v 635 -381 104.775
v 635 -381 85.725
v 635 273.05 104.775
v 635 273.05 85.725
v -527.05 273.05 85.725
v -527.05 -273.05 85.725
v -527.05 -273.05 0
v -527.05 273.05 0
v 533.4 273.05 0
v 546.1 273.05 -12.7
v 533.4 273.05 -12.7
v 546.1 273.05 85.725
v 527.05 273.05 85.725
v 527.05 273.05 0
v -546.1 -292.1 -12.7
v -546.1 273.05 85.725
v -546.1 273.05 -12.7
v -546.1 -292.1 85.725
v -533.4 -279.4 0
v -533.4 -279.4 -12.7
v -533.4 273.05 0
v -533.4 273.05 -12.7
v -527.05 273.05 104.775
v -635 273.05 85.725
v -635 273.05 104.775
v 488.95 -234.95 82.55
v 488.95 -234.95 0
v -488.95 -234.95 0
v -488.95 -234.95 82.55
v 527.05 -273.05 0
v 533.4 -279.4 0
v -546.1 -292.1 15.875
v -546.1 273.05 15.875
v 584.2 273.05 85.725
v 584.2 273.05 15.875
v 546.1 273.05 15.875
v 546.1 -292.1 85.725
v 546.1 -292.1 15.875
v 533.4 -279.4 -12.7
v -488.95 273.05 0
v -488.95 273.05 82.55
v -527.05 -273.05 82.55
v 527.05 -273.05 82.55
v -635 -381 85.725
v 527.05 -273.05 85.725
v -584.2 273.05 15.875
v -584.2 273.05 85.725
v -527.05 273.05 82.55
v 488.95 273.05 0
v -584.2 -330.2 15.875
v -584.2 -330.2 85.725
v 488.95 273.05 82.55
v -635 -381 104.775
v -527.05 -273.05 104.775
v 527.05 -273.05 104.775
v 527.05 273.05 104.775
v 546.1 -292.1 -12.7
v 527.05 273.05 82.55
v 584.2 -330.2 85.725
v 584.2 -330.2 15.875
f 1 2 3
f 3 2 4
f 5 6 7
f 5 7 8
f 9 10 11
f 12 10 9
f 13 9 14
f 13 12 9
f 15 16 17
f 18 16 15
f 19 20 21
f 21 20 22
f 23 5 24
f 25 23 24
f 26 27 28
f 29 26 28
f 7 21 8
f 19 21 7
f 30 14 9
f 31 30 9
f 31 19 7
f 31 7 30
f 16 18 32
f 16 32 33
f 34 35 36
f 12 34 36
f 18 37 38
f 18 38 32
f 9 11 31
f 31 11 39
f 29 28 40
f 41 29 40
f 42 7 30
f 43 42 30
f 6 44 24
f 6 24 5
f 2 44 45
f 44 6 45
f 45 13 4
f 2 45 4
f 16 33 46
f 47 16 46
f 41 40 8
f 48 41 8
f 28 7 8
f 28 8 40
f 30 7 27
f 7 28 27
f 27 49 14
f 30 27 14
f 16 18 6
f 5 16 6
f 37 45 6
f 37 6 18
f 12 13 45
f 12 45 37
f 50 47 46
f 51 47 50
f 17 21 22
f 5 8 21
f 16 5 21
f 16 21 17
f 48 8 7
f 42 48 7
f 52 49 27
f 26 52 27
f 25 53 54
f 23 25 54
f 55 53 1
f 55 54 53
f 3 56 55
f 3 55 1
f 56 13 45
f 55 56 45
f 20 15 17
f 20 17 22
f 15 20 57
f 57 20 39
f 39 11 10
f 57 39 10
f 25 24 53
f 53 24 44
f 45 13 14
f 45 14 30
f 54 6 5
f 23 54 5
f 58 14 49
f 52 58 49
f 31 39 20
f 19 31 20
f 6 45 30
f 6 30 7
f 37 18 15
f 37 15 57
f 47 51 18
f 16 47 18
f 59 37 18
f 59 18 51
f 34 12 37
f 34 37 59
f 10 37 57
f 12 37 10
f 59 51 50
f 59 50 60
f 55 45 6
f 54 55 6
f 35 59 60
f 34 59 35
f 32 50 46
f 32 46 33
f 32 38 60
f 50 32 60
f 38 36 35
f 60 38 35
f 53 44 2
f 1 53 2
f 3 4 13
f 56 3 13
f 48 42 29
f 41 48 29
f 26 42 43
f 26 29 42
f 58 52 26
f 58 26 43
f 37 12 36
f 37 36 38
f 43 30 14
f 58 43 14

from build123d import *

# Parameters (mm, degrees)
F2_DEPTH  = 82.55
F4_DEPTH  = 85.725
F5_DEPTH  = 12.7
F7_DEPTH  = 12.7
F9_DEPTH  = 69.85
F11_DEPTH = 19.05


with BuildPart() as f2:
    # F1 (on face) → F2 (new body)
    with BuildSketch(Plane.XY):
        Polygon((-527.0500183105, -273.0500183105), (527.0500183105, -273.0500183105), (527.0500183105, 273.0500183105), (488.9500183105, 273.0500183105), (488.9500183105, 234.9500183105), (488.9500183105, -234.9500183105), (-488.9500183105, -234.9500183105), (-488.9500183105, 234.9500183105), (-488.9500183105, 273.0500183105), (-527.0500183105, 273.0500183105), align=None)
    extrude(amount=F2_DEPTH)


with BuildPart() as f4:
    # F3 (on Top) → F4 (new body)
    with BuildSketch(Plane.XY):
        Polygon((-527.0500183105, -273.0500183105), (-527.0500183105, 273.0500183105), (-546.1000183105, 273.0500183105), (-546.1000183105, -292.1000183105), (546.1000183105, -292.1000183105), (546.1000183105, 273.0500183105), (527.0500183105, 273.0500183105), (527.0500183105, -273.0500183105), align=None)
    extrude(amount=F4_DEPTH)

    # F5 (add): a face of the model
    f5_faces = [f4.faces().sort_by_distance(p)[0] for p in [
        (0, -285.3475606825, 0),
    ]]
    extrude(f5_faces, amount=F5_DEPTH)

    # F6 (on face) → F7 (cut)
    with BuildSketch(Plane(origin=(0, 0, -12.7), x_dir=(1, 0, 0), z_dir=(0, 0, -1))):
        Polygon((533.3999991417, -273.0500183105), (533.3999991417, 279.3999991417), (-533.3999991417, 279.3999991417), (-533.3999991417, -273.0500183105), (-527.0500183105, -273.0500183105), (-527.0500183105, 273.0500183105), (527.0500183105, 273.0500183105), (527.0500183105, -273.0500183105), align=None)
    extrude(amount=-F7_DEPTH, mode=Mode.SUBTRACT)


with BuildPart() as f9:
    # F8 (on face) → F9 (new body)
    with BuildSketch(Plane.XY.offset(85.725)):
        Polygon((-546.1000183105, -292.1000183105), (-546.1000183105, 273.0500183105), (-584.2000183105, 273.0500183105), (-584.2000183105, -330.2000183105), (584.2000183105, -330.2000183105), (584.2000183105, 273.0500183105), (546.1000183105, 273.0500183105), (546.1000183105, -292.1000183105), align=None)
    extrude(amount=-F9_DEPTH)


with BuildPart() as f11:
    # F10 (on face) → F11 (new body)
    with BuildSketch(Plane.XY.offset(85.725)):
        Polygon((-635.0000183105, -381.0000183105), (635.0000183105, -381.0000183105), (635.0000183105, 273.0500183105), (527.0500183105, 273.0500183105), (527.0500183105, -273.0500183105), (-527.0500183105, -273.0500183105), (-527.0500183105, 273.0500183105), (-635.0000183105, 273.0500183105), align=None)
    extrude(amount=F11_DEPTH)


solid = Compound([f2.part, f4.part, f9.part, f11.part])
